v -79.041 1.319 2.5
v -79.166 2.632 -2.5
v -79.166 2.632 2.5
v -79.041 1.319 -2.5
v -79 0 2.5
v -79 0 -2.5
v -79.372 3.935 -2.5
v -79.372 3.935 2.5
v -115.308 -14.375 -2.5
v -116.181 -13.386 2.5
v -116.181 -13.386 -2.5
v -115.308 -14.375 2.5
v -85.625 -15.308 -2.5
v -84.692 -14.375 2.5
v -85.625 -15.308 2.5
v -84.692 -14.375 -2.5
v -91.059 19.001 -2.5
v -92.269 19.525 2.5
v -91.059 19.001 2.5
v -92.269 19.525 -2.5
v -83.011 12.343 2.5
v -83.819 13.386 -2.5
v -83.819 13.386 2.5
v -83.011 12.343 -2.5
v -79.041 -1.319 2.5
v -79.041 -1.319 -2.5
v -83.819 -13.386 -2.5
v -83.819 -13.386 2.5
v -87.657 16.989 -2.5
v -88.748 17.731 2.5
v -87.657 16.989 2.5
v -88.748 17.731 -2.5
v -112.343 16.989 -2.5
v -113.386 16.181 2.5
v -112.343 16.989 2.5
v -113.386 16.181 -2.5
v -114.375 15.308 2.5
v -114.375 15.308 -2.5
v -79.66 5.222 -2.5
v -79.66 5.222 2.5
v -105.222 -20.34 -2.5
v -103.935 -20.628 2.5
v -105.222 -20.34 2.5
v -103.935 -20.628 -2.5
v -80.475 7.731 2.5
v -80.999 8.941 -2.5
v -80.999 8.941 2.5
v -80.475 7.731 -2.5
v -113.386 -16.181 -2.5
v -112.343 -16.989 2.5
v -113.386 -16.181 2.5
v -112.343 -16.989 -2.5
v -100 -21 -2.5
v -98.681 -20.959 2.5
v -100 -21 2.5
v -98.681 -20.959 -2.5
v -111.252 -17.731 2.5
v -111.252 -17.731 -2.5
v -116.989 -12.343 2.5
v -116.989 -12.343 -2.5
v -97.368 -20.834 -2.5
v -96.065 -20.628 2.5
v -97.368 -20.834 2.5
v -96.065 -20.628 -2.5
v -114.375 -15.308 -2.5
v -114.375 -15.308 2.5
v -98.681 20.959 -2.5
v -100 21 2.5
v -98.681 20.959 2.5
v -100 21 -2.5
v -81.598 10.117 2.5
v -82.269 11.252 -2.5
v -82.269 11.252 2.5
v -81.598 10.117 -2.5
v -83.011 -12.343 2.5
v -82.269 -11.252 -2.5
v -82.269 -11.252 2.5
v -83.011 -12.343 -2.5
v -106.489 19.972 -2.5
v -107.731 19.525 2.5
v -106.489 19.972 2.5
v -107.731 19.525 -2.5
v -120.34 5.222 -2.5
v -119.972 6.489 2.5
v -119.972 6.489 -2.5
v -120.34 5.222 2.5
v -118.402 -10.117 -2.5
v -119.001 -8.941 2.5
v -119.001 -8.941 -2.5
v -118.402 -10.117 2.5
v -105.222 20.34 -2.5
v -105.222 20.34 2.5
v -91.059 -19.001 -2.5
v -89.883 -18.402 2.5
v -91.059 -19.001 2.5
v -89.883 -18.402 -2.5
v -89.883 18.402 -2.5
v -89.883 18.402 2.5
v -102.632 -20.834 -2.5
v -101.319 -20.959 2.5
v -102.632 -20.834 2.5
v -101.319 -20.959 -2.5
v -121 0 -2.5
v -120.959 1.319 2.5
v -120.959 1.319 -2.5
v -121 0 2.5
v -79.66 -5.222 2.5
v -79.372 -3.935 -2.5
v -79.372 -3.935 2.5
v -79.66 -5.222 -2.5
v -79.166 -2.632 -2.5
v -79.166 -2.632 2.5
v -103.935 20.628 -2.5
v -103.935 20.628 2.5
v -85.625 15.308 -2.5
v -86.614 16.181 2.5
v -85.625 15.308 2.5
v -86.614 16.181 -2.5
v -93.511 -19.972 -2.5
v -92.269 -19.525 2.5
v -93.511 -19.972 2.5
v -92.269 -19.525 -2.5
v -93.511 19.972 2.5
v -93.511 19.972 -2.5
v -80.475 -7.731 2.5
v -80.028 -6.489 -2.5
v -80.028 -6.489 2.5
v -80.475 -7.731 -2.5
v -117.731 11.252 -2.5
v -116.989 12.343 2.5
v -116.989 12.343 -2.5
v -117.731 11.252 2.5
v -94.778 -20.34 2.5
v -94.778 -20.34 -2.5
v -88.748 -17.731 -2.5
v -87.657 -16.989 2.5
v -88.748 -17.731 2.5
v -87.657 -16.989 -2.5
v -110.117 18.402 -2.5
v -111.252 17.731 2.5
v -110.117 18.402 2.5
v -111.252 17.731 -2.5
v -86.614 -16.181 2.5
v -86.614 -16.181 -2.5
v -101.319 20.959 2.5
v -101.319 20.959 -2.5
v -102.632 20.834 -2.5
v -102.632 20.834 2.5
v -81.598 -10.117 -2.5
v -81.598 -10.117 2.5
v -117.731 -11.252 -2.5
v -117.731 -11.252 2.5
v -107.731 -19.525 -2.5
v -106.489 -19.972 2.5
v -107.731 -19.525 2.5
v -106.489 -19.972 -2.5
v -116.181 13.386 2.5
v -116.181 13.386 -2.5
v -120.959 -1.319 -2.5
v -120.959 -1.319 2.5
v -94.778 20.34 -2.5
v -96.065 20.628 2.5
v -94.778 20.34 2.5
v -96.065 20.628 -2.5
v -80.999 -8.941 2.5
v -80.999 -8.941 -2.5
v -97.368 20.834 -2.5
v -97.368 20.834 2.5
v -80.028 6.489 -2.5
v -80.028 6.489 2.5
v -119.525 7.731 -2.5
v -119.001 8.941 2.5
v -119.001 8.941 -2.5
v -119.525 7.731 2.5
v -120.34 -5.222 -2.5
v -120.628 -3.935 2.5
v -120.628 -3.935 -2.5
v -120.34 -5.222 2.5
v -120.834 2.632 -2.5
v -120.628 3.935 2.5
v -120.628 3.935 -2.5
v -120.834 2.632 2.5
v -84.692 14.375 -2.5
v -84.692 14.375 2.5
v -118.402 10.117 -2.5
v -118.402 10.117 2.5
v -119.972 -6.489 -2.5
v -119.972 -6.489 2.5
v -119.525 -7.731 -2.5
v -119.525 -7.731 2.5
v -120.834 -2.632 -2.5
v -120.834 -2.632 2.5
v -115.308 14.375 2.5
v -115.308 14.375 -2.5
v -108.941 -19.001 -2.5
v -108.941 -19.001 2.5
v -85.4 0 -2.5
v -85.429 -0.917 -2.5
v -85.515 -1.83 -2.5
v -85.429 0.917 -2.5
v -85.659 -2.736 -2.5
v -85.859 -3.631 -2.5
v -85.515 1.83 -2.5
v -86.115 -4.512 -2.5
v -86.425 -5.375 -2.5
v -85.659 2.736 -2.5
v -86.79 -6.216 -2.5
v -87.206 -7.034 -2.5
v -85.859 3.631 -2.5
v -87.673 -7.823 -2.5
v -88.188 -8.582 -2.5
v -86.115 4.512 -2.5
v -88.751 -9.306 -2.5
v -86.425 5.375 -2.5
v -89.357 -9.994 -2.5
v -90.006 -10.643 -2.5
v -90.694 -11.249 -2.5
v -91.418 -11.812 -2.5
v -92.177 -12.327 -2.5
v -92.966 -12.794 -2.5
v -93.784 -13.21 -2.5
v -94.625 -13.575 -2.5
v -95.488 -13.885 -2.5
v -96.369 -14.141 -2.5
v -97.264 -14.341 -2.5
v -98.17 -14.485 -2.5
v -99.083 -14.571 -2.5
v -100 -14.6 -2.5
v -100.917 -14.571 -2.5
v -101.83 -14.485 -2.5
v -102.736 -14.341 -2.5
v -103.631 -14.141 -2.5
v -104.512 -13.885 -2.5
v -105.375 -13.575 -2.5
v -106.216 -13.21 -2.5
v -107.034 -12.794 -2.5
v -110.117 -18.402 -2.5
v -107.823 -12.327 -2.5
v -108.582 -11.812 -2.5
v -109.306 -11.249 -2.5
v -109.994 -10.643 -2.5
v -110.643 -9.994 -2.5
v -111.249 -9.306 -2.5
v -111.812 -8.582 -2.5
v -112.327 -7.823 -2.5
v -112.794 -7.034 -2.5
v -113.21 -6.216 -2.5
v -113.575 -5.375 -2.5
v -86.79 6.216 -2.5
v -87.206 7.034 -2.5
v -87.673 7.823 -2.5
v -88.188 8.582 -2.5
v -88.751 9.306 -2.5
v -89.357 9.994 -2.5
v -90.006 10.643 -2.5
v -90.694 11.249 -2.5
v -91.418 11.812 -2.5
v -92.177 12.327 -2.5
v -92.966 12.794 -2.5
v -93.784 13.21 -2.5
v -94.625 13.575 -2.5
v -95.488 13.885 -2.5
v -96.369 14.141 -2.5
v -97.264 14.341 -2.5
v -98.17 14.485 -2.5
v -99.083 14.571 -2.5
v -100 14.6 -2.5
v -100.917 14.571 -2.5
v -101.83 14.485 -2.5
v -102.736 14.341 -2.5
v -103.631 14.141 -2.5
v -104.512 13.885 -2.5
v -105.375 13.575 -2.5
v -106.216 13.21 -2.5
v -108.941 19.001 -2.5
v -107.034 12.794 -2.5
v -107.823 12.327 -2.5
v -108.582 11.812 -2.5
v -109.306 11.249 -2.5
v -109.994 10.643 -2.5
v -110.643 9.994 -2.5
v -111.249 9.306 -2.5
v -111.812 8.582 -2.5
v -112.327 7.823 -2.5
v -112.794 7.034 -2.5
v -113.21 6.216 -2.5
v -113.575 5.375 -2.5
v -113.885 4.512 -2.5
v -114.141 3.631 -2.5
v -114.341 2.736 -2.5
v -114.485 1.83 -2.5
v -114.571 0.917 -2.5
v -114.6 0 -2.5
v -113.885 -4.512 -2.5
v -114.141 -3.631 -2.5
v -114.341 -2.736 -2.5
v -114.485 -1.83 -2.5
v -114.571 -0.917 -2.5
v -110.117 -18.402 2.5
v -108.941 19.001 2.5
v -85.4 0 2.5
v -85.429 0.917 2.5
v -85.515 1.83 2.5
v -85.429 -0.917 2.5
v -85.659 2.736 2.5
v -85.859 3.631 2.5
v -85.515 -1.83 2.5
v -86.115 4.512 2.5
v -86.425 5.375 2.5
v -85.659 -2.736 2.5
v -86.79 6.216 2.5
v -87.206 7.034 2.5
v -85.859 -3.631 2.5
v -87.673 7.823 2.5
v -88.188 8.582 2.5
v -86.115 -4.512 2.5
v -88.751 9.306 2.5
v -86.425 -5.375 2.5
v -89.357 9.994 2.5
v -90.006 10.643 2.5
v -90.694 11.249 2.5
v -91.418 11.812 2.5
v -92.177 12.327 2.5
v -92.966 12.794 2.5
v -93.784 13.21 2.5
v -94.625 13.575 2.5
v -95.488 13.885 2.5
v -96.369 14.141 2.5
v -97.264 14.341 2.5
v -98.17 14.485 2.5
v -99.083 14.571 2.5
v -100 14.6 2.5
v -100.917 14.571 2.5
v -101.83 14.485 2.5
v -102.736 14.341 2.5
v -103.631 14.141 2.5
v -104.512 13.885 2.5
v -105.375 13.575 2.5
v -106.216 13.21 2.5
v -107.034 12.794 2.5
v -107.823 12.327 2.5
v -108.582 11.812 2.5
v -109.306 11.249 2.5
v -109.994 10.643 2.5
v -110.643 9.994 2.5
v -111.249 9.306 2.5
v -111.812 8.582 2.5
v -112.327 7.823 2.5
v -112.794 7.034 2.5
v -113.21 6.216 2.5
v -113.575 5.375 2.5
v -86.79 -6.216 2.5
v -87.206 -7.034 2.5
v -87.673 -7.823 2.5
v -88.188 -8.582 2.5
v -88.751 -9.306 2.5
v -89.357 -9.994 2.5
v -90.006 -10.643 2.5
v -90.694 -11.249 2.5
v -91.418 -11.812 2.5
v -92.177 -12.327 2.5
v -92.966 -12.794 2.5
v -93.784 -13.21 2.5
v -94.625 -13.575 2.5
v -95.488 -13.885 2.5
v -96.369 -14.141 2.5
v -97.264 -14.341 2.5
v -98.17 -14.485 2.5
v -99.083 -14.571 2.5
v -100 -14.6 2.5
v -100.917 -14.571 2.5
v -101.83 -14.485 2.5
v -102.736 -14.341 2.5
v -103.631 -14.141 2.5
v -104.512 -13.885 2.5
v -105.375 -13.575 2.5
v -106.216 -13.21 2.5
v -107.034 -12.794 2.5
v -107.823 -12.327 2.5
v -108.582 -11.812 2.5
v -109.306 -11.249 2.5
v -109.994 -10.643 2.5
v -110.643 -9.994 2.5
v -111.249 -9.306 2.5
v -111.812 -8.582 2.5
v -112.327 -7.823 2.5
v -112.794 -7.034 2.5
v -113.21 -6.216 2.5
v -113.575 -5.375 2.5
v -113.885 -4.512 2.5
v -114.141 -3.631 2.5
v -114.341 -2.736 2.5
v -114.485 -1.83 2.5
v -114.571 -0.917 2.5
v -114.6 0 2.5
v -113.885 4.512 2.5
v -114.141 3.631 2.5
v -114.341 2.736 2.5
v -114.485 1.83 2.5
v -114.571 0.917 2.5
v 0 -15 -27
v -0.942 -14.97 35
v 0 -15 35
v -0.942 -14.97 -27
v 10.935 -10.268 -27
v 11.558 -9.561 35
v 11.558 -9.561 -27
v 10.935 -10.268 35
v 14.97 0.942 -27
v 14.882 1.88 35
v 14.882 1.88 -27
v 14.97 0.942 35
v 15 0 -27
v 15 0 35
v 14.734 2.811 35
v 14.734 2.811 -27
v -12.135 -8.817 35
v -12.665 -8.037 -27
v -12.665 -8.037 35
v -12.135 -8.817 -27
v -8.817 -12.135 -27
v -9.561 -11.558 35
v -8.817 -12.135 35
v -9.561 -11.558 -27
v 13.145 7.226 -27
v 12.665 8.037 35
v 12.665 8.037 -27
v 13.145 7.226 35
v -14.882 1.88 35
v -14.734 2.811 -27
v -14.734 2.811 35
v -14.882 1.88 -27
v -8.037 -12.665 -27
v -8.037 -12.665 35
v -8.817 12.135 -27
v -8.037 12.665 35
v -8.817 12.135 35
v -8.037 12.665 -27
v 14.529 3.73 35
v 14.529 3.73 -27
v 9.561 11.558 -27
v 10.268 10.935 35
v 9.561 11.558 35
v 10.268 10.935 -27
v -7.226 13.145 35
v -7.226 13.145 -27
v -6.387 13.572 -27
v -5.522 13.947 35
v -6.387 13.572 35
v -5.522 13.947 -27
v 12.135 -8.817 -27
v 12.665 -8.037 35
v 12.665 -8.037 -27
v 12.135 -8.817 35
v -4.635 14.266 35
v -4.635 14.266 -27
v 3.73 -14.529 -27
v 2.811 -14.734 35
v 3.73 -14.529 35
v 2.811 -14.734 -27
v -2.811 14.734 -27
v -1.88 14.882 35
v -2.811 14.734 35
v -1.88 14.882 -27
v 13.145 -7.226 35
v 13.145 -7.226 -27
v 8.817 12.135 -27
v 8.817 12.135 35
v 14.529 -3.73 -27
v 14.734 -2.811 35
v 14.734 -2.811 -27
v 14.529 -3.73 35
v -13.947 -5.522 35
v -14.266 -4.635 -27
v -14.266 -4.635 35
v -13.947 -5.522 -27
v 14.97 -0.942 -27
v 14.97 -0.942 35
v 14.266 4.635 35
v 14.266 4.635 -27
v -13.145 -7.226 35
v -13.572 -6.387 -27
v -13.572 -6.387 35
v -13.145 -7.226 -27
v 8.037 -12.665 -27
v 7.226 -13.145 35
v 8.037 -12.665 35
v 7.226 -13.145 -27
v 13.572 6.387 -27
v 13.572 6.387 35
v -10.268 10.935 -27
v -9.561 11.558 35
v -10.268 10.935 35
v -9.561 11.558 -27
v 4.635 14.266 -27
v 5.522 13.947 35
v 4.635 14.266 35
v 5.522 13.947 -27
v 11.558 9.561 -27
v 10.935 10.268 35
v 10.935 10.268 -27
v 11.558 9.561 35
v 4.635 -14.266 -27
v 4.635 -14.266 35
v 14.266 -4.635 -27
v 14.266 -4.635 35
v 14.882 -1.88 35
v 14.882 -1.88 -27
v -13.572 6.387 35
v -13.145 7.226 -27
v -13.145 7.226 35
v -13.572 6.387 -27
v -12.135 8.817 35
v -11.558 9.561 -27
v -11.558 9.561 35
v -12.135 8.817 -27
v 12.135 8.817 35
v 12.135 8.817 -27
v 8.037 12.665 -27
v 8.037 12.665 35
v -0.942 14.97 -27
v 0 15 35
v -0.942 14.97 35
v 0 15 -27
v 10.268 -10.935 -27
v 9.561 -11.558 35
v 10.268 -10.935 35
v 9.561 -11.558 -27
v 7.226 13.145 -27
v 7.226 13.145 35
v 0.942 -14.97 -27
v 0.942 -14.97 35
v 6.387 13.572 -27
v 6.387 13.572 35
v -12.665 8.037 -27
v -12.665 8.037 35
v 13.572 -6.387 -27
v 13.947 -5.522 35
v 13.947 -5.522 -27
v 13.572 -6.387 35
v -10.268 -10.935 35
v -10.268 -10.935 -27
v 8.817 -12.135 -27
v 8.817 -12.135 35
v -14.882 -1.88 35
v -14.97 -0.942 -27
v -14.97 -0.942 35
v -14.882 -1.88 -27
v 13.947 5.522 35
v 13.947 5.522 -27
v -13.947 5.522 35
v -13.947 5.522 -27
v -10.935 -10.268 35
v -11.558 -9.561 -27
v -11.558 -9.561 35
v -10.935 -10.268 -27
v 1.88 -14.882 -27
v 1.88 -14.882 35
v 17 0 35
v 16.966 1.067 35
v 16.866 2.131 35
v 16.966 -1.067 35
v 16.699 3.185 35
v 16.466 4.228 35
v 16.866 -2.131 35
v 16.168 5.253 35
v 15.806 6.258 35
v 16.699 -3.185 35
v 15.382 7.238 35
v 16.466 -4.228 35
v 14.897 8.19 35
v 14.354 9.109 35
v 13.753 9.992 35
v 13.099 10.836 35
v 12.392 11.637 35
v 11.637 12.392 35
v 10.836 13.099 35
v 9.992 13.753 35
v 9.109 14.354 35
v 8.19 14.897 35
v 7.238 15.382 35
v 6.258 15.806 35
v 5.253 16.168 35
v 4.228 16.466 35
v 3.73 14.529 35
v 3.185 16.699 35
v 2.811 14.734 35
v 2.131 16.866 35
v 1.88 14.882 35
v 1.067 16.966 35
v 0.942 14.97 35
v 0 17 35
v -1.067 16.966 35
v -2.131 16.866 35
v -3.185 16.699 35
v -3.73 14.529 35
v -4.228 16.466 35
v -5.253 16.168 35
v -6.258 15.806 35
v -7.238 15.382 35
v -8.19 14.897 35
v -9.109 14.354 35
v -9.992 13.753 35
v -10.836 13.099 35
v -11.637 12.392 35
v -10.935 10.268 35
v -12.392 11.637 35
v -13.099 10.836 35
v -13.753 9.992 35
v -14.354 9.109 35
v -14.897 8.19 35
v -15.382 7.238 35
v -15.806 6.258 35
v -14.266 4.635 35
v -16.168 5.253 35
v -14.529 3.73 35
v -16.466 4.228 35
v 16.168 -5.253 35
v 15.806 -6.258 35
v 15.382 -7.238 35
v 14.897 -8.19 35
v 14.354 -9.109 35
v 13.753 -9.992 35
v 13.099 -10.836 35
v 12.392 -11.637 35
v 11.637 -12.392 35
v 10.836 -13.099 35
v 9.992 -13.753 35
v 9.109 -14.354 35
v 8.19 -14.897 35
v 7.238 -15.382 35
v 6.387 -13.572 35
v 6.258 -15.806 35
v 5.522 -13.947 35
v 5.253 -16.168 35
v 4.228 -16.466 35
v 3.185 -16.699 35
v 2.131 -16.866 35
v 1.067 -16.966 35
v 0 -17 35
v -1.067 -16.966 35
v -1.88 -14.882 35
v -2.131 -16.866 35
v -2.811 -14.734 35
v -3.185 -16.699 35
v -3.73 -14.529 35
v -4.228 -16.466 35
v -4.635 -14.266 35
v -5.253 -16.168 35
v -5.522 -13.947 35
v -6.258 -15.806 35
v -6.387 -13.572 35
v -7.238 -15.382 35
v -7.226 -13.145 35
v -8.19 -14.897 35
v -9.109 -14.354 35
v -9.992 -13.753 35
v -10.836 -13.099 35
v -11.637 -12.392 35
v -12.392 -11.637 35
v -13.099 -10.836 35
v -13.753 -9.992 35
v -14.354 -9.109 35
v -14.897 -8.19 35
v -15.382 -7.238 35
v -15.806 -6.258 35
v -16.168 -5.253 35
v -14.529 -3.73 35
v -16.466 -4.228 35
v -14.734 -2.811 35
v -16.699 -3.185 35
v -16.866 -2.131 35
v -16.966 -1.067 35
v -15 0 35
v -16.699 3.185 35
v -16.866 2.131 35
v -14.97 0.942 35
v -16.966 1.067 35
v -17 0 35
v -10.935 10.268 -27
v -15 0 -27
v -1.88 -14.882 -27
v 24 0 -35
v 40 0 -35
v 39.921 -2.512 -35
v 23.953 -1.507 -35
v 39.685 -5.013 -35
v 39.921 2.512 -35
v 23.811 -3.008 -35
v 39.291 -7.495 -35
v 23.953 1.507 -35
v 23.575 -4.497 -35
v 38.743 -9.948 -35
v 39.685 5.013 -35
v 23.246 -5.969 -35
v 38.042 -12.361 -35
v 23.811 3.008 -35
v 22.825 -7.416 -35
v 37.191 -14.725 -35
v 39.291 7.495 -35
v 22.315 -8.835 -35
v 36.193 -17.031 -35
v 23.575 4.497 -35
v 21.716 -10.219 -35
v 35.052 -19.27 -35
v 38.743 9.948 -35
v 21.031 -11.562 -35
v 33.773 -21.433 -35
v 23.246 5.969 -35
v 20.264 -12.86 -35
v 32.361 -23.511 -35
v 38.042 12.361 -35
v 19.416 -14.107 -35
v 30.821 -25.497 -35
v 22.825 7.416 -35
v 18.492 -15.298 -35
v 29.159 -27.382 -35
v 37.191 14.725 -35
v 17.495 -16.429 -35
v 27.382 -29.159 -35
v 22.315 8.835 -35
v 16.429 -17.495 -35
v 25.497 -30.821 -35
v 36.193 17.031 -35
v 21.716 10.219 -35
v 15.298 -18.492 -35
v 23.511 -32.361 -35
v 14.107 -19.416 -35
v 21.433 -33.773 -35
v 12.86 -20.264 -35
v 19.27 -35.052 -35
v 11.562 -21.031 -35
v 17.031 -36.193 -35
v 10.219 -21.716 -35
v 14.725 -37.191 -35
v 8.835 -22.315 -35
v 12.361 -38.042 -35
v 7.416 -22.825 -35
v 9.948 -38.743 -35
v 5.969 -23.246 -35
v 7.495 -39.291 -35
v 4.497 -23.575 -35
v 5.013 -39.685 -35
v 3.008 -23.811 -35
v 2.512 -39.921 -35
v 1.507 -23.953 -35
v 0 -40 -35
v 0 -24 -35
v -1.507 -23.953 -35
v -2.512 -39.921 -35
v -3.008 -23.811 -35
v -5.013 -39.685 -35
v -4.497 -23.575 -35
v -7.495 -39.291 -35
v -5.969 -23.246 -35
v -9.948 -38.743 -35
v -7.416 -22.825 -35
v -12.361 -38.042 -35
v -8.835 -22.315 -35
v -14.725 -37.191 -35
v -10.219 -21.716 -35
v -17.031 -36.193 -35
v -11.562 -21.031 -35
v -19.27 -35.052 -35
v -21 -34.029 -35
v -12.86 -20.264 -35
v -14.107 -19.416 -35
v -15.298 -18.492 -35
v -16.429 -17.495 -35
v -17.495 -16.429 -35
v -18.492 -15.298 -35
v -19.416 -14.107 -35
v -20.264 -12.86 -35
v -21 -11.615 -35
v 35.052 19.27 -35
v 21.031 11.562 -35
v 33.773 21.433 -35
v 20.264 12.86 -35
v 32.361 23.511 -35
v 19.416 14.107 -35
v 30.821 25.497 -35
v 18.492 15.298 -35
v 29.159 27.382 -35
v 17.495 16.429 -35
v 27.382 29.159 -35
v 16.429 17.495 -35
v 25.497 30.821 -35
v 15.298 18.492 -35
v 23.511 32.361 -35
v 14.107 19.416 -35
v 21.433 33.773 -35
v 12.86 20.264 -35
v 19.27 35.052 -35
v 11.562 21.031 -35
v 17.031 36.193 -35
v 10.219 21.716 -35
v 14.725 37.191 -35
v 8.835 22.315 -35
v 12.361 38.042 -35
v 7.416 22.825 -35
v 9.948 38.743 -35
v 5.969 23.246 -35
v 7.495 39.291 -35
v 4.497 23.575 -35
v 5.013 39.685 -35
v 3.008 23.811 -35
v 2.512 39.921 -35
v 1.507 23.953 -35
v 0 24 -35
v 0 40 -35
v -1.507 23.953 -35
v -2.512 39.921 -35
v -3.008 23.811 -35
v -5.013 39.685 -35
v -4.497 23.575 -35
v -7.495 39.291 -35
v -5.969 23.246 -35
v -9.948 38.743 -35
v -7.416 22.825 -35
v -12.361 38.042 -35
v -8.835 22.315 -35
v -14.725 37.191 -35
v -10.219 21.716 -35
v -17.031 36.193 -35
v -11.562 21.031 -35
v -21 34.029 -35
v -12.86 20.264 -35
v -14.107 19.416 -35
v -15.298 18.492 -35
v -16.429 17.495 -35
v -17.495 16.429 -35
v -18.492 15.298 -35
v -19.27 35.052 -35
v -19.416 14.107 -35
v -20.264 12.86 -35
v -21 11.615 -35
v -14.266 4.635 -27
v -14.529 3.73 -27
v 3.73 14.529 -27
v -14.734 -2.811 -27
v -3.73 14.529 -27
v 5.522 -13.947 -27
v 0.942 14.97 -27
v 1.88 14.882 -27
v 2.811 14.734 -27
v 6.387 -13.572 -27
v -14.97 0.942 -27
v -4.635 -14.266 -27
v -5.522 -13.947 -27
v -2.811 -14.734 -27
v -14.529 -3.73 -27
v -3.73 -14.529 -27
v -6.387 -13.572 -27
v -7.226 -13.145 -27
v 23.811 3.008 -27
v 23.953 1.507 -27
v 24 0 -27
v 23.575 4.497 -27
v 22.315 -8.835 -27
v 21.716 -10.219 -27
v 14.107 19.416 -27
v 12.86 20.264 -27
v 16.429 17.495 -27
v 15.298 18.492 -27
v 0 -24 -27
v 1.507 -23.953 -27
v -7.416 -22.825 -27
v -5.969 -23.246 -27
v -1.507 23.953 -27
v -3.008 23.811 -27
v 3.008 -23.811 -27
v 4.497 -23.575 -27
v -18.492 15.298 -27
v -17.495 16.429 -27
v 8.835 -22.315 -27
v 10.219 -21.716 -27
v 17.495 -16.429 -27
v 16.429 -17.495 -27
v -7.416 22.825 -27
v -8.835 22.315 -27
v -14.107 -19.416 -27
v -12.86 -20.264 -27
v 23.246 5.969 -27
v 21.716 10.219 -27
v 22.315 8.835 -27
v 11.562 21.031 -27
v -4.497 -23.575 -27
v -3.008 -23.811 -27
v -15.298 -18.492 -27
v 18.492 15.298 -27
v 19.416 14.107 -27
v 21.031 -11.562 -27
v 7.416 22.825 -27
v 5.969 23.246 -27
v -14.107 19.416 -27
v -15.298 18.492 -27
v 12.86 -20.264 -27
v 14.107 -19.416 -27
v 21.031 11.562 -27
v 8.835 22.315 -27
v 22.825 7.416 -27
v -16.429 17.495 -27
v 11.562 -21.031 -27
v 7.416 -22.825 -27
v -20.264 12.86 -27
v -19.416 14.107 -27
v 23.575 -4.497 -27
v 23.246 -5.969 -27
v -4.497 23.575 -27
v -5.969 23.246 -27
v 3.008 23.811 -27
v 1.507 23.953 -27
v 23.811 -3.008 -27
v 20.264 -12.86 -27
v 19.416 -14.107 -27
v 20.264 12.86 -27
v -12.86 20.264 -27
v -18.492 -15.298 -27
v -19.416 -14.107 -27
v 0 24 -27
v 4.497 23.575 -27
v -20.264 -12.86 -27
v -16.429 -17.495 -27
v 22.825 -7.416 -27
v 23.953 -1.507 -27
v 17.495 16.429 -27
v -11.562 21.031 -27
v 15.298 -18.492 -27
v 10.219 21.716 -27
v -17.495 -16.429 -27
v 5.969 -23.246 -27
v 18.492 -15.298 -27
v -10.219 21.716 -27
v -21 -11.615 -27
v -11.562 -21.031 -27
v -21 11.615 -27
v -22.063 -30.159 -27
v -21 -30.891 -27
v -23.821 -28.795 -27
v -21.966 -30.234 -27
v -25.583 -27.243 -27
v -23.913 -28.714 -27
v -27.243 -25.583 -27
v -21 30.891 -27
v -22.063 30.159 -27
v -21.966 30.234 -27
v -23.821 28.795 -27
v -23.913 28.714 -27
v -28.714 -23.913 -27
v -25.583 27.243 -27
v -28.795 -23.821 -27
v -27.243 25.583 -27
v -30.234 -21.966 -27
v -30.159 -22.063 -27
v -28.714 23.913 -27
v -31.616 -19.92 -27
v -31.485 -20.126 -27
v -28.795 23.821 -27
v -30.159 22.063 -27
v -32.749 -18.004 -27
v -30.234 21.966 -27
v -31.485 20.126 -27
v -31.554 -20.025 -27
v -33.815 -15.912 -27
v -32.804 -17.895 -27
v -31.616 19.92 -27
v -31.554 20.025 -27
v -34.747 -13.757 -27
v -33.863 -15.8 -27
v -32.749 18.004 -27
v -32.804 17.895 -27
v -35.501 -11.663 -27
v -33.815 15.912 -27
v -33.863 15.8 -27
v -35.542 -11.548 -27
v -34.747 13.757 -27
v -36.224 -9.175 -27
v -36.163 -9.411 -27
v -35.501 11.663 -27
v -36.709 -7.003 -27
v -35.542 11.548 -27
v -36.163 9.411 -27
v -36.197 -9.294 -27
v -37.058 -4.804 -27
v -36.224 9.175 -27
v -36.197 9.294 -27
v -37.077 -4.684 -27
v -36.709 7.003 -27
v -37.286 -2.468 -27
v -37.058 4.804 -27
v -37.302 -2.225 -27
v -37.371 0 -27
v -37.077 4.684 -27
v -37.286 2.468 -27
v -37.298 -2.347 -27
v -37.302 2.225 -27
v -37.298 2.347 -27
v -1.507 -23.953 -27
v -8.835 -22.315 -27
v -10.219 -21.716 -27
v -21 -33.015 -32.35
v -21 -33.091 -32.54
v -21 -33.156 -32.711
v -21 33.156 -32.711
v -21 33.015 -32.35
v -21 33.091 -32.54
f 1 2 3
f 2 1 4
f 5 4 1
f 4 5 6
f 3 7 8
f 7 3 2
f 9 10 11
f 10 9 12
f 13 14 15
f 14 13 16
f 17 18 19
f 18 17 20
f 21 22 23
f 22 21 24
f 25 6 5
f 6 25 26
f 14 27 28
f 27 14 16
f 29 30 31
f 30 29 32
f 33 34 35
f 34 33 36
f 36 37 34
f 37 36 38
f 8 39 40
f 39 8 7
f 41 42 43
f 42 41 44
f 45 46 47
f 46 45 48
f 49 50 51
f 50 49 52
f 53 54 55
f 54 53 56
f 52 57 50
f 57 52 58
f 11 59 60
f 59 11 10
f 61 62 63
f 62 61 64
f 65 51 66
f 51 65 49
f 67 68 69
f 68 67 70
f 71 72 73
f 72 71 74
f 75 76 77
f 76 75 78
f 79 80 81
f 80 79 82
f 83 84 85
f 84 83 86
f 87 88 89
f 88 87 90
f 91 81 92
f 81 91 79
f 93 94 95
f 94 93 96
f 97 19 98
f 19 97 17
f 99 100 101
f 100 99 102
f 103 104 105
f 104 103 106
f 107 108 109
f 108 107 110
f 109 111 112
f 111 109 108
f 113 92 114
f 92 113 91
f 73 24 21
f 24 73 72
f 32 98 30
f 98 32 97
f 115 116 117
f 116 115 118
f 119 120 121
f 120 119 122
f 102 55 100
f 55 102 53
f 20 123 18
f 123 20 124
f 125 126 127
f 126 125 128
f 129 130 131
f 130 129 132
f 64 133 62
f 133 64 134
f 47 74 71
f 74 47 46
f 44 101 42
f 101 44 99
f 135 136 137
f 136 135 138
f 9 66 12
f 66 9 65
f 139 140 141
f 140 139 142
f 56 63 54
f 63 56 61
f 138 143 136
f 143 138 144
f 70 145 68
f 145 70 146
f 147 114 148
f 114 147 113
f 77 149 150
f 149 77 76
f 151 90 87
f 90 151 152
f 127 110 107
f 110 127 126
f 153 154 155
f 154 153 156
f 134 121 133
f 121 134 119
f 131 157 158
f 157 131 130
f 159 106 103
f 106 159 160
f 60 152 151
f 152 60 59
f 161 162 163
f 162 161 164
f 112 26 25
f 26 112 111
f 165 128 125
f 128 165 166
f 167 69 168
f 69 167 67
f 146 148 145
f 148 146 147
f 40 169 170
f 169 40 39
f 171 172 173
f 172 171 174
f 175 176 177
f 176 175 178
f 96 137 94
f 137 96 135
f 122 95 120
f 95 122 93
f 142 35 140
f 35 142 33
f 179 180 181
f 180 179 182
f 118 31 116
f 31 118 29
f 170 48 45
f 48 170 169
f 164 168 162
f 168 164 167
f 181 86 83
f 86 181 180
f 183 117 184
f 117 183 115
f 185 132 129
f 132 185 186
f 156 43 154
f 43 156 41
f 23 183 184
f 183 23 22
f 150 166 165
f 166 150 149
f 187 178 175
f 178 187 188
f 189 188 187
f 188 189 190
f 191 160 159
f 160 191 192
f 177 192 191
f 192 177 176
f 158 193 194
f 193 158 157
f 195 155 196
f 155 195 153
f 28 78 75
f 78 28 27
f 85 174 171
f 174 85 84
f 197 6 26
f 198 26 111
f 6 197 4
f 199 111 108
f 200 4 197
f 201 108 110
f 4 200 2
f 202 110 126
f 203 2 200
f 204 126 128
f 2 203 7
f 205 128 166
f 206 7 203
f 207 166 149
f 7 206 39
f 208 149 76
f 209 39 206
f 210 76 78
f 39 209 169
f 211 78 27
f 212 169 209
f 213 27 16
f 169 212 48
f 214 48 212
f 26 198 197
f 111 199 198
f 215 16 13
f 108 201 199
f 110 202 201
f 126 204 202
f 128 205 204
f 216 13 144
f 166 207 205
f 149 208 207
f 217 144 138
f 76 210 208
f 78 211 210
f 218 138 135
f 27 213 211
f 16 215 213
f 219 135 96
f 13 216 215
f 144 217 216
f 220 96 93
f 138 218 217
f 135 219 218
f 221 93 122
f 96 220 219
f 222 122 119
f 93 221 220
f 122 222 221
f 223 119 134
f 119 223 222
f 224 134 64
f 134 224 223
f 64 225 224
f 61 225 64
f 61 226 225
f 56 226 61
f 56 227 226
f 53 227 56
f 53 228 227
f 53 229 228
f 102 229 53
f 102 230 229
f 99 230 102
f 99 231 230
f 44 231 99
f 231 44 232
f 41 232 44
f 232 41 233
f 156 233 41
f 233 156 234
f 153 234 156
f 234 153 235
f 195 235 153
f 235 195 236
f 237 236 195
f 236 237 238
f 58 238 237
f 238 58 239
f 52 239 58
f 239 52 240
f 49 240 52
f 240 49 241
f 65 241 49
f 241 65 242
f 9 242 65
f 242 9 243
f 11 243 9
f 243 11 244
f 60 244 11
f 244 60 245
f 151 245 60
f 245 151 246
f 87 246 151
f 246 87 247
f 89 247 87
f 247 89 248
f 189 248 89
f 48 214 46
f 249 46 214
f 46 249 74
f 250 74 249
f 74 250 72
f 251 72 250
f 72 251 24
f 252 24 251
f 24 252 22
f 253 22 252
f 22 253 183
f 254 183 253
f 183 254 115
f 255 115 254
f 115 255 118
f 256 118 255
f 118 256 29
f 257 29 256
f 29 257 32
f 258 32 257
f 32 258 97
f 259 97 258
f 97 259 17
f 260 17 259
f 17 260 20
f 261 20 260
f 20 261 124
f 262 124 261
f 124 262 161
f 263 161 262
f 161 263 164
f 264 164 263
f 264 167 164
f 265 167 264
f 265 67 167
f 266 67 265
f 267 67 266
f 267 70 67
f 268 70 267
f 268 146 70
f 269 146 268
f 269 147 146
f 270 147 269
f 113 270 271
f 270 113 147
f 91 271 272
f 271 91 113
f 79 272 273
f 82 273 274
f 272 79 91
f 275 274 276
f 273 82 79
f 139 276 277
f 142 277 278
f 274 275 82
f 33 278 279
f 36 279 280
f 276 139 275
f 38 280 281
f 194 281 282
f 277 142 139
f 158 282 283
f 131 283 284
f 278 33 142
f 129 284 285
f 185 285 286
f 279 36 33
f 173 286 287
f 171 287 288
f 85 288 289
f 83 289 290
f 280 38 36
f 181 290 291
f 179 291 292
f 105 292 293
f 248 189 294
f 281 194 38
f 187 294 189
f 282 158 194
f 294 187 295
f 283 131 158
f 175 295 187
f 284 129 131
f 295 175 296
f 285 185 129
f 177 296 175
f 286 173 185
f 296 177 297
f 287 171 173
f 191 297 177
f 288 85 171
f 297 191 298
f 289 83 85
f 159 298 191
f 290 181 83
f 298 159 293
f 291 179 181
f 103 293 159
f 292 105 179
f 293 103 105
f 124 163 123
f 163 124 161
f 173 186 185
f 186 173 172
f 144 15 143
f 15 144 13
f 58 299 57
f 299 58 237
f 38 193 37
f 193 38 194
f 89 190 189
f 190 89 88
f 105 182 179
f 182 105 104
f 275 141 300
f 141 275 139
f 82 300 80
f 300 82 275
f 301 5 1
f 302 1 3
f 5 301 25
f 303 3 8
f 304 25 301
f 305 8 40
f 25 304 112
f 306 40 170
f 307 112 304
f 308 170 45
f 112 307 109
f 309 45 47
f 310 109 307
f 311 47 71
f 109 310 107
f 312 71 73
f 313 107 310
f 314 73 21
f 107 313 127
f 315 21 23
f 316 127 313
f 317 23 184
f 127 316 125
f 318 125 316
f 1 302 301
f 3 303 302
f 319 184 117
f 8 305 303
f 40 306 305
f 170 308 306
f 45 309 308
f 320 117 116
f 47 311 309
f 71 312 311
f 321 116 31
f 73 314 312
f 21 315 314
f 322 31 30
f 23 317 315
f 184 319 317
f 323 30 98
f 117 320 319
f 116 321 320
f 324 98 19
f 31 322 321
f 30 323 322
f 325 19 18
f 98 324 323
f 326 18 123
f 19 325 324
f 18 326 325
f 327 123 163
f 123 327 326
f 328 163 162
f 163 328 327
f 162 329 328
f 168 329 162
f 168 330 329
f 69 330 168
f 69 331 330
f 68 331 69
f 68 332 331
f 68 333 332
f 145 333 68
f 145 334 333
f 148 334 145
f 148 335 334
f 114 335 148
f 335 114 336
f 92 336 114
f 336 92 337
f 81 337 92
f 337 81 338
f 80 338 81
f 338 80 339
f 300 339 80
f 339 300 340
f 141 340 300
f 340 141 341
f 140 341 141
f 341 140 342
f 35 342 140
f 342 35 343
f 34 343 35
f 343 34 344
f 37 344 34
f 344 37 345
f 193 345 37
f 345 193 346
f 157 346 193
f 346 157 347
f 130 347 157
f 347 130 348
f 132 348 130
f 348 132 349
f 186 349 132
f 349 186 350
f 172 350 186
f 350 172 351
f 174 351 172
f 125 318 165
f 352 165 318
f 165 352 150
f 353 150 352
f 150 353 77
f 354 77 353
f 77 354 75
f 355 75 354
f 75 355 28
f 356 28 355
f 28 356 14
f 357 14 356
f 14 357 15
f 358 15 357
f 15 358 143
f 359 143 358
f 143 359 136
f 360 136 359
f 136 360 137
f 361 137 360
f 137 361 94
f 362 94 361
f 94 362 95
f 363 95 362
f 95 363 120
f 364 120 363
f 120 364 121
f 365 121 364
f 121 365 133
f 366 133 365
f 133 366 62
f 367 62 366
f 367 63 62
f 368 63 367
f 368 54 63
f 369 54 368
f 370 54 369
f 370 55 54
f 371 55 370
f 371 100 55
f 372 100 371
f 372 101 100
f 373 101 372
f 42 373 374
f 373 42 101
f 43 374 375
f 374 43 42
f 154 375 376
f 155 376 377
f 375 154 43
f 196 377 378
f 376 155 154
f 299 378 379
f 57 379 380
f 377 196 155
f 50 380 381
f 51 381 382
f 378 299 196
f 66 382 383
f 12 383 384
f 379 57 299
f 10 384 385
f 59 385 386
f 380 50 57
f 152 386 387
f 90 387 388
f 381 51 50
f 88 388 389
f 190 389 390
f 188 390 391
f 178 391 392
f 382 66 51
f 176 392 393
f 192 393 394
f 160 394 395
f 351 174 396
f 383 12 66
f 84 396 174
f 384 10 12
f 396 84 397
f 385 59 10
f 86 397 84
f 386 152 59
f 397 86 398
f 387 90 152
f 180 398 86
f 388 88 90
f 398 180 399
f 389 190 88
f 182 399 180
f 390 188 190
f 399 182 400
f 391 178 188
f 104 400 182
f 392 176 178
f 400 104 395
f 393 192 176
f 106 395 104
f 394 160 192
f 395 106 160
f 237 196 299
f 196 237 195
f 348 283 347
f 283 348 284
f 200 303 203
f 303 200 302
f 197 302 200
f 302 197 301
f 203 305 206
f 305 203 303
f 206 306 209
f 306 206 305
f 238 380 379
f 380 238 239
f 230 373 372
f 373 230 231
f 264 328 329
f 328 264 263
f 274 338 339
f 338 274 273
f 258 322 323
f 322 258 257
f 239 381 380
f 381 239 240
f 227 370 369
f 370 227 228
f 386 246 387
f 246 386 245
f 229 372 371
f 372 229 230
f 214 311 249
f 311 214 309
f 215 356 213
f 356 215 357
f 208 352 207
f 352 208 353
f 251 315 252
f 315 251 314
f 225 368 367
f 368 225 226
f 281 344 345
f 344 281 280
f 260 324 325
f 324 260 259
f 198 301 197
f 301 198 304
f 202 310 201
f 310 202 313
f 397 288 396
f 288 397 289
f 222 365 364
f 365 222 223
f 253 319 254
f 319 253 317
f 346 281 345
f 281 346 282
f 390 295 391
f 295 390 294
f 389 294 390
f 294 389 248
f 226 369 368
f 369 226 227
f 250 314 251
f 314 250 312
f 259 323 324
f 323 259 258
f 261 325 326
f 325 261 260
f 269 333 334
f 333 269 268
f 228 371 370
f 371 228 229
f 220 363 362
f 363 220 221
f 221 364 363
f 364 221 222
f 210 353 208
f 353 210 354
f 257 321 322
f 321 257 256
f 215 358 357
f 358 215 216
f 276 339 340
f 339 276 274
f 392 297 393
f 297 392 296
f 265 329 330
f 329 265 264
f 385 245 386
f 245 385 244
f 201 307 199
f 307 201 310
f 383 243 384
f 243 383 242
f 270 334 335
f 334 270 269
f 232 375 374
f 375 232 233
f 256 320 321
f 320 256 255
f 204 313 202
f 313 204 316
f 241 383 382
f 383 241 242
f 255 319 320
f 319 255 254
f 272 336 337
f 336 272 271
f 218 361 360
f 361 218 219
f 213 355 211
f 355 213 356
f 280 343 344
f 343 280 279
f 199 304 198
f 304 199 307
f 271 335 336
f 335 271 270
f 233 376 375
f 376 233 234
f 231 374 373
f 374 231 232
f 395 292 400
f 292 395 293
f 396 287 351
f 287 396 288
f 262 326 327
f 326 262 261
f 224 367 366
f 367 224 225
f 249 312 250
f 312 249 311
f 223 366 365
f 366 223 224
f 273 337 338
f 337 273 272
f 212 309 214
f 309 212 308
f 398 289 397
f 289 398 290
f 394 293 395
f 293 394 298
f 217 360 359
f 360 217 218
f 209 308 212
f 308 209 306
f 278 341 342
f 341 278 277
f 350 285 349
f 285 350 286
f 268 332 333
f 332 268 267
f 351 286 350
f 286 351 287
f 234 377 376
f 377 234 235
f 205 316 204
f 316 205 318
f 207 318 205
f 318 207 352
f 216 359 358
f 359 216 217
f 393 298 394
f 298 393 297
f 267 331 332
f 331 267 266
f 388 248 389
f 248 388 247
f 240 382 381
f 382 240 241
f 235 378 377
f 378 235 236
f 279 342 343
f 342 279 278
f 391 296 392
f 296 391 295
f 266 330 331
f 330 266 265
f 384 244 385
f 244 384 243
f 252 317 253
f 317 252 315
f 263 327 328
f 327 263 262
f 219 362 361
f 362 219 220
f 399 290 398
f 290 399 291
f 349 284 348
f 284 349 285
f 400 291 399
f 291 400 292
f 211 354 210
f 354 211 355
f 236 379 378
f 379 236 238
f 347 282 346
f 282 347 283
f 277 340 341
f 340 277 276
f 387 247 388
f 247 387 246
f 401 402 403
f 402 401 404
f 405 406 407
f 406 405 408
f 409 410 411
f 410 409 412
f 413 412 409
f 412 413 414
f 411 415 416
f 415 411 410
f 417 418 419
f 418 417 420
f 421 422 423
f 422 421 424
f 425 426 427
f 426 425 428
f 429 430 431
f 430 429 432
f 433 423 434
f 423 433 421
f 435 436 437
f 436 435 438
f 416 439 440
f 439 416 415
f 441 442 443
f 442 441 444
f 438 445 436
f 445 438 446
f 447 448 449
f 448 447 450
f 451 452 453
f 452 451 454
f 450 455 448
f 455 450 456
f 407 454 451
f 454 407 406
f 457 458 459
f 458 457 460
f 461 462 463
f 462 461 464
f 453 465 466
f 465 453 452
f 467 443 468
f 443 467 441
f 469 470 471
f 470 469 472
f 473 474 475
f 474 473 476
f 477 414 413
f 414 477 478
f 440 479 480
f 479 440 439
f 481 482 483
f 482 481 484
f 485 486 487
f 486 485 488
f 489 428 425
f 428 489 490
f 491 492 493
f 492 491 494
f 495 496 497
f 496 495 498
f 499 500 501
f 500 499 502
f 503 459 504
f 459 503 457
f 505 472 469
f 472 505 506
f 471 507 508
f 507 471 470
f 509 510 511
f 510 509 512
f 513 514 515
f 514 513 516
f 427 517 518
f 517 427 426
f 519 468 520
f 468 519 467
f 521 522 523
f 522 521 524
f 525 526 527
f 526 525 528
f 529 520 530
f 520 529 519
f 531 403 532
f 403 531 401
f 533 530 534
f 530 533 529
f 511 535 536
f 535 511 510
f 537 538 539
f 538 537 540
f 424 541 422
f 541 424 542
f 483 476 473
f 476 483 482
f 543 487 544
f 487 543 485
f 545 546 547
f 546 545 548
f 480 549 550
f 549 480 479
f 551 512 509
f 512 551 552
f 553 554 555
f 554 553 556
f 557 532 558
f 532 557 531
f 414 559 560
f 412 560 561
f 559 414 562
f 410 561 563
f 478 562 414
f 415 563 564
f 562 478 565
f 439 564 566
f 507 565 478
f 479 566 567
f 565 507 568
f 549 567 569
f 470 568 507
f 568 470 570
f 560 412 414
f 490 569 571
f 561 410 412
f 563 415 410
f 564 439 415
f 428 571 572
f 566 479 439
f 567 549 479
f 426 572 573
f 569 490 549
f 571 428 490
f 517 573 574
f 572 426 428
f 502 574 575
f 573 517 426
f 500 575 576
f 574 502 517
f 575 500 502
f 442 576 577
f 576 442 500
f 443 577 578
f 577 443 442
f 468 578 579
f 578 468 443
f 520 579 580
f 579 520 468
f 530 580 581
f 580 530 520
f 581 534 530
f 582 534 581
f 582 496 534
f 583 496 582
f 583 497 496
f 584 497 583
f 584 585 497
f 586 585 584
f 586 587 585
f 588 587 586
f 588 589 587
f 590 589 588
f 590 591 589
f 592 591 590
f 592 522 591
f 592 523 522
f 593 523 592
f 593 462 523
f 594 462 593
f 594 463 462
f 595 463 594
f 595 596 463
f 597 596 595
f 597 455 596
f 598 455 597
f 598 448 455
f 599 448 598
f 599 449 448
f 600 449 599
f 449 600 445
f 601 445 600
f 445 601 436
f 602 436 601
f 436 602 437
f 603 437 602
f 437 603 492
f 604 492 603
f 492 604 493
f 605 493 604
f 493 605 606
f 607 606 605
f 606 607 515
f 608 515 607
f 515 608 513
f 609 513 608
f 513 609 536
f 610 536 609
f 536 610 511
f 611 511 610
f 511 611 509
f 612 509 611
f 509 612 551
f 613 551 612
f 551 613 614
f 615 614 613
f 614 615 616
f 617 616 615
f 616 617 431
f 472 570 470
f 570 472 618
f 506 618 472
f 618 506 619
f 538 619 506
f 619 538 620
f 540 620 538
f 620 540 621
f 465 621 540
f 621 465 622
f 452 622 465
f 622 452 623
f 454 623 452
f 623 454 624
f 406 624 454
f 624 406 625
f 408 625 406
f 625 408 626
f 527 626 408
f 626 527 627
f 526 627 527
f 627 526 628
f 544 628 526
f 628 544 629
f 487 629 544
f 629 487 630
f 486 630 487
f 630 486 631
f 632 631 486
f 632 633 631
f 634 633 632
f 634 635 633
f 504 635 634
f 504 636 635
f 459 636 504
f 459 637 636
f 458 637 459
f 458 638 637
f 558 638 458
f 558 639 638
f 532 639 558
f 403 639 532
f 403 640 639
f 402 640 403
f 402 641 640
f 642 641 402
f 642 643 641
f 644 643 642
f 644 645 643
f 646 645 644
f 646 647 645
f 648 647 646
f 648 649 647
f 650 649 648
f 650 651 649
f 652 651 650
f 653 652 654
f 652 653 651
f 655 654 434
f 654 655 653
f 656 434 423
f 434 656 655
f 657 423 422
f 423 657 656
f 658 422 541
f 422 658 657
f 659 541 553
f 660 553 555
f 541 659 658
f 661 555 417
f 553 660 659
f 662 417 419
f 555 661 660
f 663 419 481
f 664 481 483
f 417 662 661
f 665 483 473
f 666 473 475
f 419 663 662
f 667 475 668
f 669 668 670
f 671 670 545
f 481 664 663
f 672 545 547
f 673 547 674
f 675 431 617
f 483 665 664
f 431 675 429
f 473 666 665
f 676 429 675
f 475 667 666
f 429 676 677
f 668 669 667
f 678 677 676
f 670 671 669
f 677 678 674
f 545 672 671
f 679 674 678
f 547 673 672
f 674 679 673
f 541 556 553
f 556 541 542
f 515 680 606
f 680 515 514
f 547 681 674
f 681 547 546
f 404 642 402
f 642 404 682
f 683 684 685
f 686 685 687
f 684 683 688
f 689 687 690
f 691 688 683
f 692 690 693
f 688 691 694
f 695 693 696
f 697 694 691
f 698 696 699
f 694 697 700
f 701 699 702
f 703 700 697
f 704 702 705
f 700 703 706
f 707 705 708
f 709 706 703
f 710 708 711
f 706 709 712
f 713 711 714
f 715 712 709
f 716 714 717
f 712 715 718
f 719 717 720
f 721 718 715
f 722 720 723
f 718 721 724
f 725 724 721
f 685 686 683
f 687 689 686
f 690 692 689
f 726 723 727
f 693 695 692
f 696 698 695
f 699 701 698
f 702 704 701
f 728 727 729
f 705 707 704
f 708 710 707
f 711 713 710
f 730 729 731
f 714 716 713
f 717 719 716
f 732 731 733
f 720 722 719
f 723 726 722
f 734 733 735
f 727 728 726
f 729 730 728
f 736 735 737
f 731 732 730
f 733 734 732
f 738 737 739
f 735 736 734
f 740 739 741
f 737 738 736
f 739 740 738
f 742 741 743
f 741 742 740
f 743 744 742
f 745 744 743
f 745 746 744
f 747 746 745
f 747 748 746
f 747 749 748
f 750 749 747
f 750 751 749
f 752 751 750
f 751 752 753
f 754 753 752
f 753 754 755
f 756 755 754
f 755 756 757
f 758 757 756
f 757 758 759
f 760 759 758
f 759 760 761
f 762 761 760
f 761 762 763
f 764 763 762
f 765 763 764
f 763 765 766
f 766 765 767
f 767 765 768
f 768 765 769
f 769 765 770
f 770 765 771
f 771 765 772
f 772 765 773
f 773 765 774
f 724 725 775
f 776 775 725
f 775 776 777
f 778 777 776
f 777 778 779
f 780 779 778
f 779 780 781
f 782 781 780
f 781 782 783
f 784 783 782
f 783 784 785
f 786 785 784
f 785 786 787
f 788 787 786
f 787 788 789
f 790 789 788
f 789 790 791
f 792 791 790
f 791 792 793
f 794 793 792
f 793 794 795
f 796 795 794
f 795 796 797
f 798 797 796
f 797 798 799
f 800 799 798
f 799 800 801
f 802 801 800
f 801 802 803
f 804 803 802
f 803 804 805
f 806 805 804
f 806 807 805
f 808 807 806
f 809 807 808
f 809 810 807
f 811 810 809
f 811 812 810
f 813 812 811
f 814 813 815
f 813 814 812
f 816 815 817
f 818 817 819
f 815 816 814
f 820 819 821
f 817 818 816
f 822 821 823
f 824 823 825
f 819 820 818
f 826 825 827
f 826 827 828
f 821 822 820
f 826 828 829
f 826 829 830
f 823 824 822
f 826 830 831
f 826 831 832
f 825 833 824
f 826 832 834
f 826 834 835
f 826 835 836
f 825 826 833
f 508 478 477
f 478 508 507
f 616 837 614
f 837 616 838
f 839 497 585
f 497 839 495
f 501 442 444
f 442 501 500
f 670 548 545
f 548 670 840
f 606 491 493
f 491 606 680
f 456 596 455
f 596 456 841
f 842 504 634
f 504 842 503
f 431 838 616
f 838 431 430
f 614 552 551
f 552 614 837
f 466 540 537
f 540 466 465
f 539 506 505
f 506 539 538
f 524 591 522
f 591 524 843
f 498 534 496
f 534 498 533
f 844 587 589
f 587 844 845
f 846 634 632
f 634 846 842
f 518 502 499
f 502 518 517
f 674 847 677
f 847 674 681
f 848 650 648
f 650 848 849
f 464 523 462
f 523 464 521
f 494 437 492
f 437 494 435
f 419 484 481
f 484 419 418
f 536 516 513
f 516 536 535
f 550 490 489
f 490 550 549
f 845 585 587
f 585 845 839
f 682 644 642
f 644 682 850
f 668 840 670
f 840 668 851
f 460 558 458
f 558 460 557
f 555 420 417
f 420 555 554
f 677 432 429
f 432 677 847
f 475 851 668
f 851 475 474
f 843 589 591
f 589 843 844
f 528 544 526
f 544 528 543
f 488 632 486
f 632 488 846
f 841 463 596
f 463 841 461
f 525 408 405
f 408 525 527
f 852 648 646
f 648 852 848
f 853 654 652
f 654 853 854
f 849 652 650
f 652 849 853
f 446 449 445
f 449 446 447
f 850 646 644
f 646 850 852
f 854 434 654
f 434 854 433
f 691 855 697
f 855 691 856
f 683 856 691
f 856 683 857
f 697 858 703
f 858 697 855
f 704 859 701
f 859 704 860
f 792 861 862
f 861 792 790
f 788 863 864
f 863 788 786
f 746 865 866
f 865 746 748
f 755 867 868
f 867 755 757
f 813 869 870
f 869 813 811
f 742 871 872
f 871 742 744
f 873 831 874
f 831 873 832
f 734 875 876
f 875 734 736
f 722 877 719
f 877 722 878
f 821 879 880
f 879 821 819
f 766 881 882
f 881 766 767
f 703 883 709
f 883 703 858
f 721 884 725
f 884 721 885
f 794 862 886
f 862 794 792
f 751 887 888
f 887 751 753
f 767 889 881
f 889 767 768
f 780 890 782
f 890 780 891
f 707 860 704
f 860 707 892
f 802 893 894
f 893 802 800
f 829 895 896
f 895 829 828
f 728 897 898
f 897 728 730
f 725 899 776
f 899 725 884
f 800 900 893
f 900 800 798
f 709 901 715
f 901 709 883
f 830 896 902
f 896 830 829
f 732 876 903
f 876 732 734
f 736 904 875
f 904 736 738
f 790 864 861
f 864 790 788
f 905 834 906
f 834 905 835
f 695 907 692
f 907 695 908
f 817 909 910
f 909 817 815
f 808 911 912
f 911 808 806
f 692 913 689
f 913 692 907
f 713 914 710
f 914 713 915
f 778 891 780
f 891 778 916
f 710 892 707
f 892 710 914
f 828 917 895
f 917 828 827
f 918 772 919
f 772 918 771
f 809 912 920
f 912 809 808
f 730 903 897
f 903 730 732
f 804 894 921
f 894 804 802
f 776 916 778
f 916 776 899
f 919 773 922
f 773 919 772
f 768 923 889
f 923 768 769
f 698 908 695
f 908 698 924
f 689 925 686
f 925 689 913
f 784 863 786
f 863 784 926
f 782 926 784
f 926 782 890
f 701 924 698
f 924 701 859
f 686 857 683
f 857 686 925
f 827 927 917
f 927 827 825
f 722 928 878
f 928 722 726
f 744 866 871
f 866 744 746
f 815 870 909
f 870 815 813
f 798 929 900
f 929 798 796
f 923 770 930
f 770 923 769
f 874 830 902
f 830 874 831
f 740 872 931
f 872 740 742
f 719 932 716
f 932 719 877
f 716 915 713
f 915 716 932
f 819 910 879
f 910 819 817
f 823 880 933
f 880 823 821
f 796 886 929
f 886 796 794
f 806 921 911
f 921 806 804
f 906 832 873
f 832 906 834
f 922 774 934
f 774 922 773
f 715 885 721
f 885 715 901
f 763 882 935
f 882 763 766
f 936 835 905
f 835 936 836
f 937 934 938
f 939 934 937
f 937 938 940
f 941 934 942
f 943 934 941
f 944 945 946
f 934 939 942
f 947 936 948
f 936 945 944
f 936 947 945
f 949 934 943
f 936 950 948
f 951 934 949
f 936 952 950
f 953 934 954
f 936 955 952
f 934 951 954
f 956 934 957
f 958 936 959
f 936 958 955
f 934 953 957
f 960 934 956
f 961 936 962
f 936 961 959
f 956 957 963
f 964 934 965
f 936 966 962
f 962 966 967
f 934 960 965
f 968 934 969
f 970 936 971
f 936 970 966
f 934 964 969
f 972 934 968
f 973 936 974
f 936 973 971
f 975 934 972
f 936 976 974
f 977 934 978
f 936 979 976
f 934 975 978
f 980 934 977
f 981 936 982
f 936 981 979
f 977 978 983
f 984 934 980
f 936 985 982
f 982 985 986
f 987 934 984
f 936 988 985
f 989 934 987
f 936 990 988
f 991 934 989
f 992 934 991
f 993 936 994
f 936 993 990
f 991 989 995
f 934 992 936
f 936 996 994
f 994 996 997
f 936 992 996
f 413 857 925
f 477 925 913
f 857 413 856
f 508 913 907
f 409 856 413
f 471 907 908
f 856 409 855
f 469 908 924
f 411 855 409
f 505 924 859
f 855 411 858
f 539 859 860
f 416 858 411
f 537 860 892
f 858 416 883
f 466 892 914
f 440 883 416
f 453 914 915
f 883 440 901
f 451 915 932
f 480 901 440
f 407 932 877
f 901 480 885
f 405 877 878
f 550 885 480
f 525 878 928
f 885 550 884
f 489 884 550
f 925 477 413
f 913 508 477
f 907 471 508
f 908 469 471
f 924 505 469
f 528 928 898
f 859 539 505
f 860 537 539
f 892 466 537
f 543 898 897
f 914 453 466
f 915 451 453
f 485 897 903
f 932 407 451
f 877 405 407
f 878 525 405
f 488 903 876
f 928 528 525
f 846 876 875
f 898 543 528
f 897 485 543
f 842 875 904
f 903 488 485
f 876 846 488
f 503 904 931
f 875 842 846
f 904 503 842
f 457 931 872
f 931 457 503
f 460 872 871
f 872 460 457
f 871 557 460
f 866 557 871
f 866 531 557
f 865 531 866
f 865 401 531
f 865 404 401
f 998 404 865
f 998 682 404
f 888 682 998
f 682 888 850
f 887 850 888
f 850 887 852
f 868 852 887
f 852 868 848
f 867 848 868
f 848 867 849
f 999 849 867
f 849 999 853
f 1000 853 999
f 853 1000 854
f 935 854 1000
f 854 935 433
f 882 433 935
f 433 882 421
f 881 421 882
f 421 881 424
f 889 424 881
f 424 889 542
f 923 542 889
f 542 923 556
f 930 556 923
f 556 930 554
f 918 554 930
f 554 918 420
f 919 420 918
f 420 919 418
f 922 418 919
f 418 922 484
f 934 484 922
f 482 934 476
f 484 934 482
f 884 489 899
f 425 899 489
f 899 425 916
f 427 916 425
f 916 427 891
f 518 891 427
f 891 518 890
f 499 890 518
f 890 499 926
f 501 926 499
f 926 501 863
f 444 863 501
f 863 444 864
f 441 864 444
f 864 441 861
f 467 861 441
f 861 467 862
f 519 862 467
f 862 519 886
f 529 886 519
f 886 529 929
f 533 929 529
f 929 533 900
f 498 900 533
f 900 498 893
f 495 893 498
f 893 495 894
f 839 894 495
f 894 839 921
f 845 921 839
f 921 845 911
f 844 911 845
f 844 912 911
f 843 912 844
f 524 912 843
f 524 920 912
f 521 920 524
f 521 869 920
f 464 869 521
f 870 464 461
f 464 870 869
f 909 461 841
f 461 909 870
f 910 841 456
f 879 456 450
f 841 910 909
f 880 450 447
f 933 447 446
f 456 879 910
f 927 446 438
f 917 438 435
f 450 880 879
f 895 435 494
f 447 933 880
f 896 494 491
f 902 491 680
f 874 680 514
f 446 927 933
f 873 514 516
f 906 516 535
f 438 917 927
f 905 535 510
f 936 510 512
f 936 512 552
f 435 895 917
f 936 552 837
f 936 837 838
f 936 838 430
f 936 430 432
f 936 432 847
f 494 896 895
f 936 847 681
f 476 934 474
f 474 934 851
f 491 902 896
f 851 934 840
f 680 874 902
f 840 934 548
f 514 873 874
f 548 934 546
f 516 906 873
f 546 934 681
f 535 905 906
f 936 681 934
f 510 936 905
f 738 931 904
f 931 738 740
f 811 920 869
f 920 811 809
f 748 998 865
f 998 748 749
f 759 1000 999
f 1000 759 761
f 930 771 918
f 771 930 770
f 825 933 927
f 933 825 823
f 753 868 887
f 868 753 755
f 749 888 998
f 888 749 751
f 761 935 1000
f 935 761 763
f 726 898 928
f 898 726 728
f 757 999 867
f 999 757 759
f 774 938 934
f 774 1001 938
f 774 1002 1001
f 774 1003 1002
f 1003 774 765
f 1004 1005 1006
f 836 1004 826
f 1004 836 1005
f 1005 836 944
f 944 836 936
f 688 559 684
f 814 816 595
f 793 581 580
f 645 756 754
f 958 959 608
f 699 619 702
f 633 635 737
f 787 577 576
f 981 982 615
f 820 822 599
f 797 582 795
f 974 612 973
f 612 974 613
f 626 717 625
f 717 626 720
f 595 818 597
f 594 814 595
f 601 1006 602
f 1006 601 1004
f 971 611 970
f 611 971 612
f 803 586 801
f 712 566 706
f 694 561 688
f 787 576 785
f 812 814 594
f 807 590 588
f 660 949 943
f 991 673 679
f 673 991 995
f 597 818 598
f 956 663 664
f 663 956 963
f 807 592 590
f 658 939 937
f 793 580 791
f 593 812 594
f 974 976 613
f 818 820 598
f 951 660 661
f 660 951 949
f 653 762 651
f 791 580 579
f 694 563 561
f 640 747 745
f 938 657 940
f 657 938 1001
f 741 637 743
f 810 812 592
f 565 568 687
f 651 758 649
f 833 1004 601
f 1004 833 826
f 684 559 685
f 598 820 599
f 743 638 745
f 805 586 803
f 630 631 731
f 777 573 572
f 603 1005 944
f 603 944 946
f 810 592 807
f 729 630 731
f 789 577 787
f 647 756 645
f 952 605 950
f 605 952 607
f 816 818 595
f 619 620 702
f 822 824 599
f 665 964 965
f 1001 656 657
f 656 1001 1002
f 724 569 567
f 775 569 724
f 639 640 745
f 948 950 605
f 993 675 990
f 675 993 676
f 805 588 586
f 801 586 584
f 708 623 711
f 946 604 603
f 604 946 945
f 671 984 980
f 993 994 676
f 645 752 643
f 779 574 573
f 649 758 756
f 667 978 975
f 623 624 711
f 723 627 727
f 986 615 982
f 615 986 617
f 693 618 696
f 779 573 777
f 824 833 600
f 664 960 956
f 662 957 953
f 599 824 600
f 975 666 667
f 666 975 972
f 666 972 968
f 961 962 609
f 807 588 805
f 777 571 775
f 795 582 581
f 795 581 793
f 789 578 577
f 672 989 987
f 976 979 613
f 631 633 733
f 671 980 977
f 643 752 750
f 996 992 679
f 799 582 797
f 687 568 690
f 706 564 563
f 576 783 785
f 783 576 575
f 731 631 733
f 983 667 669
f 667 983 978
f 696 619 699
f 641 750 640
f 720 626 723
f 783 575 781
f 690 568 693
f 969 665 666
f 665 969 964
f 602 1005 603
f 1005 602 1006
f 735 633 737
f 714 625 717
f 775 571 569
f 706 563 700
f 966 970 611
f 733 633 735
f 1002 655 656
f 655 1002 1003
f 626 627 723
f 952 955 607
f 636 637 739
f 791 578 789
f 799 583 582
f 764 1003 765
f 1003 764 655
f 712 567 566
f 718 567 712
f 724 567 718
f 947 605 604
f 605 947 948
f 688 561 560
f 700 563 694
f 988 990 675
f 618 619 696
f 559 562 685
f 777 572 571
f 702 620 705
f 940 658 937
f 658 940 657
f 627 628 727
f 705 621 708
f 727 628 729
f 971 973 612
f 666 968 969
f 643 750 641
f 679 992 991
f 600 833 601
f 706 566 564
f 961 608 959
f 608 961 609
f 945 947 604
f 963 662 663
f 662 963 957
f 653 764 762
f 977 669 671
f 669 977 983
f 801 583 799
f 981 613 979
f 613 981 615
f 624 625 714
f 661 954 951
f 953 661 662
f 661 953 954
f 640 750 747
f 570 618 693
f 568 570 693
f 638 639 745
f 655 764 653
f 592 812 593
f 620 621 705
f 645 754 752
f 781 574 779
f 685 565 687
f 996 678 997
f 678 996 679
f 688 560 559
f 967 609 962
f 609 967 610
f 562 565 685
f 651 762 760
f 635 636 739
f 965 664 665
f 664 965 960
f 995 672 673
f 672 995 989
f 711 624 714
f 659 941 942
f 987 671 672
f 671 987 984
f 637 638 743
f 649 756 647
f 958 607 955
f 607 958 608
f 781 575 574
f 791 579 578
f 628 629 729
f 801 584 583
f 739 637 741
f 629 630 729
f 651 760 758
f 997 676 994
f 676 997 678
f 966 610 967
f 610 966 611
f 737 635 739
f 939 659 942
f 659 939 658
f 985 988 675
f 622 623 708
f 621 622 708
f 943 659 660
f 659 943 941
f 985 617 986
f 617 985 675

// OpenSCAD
/// Inside support for the tube ///
/// The inner diameter of the holders has to be adjusted according to the outer diameter of the tube used ///

h5=5;
r5=21;
h6=5;
r7=1.2;
h7=5;
r7=14.6;

module in_plus(){
    translate ([-100,0,0]) {cylinder (h5, r5, r5, $fn = 100, center = true);}

}

module in_minus(){
    translate ([-100,0,0]) {cylinder (h7, r7, r7, $fn = 100, center = true);}

}

{difference(){in_plus(); in_minus();}}


///Outside support for the tube///

h1=70;
h2=8;
r1=80/2;
r2=34/2;
r3=30/2;
r4=48/2;
x=28;
y=80;
z=9;

module plus(){
    translate ([0,0,0]) cylinder (h1, r1, r2, $fn = 100, center = true);
       
}

module minus(){
    translate ([0,0,0]) cylinder (h1, r3, r3, $fn = 100, center = true);
    
    translate ([0,0,-31]) cylinder (h2, r4, r4, $fn = 100, center = true);
    
    translate ([-35,0,-31.5]) cube ([x, y, z], center = true); 
    
}

{difference() {plus(); minus();}}
